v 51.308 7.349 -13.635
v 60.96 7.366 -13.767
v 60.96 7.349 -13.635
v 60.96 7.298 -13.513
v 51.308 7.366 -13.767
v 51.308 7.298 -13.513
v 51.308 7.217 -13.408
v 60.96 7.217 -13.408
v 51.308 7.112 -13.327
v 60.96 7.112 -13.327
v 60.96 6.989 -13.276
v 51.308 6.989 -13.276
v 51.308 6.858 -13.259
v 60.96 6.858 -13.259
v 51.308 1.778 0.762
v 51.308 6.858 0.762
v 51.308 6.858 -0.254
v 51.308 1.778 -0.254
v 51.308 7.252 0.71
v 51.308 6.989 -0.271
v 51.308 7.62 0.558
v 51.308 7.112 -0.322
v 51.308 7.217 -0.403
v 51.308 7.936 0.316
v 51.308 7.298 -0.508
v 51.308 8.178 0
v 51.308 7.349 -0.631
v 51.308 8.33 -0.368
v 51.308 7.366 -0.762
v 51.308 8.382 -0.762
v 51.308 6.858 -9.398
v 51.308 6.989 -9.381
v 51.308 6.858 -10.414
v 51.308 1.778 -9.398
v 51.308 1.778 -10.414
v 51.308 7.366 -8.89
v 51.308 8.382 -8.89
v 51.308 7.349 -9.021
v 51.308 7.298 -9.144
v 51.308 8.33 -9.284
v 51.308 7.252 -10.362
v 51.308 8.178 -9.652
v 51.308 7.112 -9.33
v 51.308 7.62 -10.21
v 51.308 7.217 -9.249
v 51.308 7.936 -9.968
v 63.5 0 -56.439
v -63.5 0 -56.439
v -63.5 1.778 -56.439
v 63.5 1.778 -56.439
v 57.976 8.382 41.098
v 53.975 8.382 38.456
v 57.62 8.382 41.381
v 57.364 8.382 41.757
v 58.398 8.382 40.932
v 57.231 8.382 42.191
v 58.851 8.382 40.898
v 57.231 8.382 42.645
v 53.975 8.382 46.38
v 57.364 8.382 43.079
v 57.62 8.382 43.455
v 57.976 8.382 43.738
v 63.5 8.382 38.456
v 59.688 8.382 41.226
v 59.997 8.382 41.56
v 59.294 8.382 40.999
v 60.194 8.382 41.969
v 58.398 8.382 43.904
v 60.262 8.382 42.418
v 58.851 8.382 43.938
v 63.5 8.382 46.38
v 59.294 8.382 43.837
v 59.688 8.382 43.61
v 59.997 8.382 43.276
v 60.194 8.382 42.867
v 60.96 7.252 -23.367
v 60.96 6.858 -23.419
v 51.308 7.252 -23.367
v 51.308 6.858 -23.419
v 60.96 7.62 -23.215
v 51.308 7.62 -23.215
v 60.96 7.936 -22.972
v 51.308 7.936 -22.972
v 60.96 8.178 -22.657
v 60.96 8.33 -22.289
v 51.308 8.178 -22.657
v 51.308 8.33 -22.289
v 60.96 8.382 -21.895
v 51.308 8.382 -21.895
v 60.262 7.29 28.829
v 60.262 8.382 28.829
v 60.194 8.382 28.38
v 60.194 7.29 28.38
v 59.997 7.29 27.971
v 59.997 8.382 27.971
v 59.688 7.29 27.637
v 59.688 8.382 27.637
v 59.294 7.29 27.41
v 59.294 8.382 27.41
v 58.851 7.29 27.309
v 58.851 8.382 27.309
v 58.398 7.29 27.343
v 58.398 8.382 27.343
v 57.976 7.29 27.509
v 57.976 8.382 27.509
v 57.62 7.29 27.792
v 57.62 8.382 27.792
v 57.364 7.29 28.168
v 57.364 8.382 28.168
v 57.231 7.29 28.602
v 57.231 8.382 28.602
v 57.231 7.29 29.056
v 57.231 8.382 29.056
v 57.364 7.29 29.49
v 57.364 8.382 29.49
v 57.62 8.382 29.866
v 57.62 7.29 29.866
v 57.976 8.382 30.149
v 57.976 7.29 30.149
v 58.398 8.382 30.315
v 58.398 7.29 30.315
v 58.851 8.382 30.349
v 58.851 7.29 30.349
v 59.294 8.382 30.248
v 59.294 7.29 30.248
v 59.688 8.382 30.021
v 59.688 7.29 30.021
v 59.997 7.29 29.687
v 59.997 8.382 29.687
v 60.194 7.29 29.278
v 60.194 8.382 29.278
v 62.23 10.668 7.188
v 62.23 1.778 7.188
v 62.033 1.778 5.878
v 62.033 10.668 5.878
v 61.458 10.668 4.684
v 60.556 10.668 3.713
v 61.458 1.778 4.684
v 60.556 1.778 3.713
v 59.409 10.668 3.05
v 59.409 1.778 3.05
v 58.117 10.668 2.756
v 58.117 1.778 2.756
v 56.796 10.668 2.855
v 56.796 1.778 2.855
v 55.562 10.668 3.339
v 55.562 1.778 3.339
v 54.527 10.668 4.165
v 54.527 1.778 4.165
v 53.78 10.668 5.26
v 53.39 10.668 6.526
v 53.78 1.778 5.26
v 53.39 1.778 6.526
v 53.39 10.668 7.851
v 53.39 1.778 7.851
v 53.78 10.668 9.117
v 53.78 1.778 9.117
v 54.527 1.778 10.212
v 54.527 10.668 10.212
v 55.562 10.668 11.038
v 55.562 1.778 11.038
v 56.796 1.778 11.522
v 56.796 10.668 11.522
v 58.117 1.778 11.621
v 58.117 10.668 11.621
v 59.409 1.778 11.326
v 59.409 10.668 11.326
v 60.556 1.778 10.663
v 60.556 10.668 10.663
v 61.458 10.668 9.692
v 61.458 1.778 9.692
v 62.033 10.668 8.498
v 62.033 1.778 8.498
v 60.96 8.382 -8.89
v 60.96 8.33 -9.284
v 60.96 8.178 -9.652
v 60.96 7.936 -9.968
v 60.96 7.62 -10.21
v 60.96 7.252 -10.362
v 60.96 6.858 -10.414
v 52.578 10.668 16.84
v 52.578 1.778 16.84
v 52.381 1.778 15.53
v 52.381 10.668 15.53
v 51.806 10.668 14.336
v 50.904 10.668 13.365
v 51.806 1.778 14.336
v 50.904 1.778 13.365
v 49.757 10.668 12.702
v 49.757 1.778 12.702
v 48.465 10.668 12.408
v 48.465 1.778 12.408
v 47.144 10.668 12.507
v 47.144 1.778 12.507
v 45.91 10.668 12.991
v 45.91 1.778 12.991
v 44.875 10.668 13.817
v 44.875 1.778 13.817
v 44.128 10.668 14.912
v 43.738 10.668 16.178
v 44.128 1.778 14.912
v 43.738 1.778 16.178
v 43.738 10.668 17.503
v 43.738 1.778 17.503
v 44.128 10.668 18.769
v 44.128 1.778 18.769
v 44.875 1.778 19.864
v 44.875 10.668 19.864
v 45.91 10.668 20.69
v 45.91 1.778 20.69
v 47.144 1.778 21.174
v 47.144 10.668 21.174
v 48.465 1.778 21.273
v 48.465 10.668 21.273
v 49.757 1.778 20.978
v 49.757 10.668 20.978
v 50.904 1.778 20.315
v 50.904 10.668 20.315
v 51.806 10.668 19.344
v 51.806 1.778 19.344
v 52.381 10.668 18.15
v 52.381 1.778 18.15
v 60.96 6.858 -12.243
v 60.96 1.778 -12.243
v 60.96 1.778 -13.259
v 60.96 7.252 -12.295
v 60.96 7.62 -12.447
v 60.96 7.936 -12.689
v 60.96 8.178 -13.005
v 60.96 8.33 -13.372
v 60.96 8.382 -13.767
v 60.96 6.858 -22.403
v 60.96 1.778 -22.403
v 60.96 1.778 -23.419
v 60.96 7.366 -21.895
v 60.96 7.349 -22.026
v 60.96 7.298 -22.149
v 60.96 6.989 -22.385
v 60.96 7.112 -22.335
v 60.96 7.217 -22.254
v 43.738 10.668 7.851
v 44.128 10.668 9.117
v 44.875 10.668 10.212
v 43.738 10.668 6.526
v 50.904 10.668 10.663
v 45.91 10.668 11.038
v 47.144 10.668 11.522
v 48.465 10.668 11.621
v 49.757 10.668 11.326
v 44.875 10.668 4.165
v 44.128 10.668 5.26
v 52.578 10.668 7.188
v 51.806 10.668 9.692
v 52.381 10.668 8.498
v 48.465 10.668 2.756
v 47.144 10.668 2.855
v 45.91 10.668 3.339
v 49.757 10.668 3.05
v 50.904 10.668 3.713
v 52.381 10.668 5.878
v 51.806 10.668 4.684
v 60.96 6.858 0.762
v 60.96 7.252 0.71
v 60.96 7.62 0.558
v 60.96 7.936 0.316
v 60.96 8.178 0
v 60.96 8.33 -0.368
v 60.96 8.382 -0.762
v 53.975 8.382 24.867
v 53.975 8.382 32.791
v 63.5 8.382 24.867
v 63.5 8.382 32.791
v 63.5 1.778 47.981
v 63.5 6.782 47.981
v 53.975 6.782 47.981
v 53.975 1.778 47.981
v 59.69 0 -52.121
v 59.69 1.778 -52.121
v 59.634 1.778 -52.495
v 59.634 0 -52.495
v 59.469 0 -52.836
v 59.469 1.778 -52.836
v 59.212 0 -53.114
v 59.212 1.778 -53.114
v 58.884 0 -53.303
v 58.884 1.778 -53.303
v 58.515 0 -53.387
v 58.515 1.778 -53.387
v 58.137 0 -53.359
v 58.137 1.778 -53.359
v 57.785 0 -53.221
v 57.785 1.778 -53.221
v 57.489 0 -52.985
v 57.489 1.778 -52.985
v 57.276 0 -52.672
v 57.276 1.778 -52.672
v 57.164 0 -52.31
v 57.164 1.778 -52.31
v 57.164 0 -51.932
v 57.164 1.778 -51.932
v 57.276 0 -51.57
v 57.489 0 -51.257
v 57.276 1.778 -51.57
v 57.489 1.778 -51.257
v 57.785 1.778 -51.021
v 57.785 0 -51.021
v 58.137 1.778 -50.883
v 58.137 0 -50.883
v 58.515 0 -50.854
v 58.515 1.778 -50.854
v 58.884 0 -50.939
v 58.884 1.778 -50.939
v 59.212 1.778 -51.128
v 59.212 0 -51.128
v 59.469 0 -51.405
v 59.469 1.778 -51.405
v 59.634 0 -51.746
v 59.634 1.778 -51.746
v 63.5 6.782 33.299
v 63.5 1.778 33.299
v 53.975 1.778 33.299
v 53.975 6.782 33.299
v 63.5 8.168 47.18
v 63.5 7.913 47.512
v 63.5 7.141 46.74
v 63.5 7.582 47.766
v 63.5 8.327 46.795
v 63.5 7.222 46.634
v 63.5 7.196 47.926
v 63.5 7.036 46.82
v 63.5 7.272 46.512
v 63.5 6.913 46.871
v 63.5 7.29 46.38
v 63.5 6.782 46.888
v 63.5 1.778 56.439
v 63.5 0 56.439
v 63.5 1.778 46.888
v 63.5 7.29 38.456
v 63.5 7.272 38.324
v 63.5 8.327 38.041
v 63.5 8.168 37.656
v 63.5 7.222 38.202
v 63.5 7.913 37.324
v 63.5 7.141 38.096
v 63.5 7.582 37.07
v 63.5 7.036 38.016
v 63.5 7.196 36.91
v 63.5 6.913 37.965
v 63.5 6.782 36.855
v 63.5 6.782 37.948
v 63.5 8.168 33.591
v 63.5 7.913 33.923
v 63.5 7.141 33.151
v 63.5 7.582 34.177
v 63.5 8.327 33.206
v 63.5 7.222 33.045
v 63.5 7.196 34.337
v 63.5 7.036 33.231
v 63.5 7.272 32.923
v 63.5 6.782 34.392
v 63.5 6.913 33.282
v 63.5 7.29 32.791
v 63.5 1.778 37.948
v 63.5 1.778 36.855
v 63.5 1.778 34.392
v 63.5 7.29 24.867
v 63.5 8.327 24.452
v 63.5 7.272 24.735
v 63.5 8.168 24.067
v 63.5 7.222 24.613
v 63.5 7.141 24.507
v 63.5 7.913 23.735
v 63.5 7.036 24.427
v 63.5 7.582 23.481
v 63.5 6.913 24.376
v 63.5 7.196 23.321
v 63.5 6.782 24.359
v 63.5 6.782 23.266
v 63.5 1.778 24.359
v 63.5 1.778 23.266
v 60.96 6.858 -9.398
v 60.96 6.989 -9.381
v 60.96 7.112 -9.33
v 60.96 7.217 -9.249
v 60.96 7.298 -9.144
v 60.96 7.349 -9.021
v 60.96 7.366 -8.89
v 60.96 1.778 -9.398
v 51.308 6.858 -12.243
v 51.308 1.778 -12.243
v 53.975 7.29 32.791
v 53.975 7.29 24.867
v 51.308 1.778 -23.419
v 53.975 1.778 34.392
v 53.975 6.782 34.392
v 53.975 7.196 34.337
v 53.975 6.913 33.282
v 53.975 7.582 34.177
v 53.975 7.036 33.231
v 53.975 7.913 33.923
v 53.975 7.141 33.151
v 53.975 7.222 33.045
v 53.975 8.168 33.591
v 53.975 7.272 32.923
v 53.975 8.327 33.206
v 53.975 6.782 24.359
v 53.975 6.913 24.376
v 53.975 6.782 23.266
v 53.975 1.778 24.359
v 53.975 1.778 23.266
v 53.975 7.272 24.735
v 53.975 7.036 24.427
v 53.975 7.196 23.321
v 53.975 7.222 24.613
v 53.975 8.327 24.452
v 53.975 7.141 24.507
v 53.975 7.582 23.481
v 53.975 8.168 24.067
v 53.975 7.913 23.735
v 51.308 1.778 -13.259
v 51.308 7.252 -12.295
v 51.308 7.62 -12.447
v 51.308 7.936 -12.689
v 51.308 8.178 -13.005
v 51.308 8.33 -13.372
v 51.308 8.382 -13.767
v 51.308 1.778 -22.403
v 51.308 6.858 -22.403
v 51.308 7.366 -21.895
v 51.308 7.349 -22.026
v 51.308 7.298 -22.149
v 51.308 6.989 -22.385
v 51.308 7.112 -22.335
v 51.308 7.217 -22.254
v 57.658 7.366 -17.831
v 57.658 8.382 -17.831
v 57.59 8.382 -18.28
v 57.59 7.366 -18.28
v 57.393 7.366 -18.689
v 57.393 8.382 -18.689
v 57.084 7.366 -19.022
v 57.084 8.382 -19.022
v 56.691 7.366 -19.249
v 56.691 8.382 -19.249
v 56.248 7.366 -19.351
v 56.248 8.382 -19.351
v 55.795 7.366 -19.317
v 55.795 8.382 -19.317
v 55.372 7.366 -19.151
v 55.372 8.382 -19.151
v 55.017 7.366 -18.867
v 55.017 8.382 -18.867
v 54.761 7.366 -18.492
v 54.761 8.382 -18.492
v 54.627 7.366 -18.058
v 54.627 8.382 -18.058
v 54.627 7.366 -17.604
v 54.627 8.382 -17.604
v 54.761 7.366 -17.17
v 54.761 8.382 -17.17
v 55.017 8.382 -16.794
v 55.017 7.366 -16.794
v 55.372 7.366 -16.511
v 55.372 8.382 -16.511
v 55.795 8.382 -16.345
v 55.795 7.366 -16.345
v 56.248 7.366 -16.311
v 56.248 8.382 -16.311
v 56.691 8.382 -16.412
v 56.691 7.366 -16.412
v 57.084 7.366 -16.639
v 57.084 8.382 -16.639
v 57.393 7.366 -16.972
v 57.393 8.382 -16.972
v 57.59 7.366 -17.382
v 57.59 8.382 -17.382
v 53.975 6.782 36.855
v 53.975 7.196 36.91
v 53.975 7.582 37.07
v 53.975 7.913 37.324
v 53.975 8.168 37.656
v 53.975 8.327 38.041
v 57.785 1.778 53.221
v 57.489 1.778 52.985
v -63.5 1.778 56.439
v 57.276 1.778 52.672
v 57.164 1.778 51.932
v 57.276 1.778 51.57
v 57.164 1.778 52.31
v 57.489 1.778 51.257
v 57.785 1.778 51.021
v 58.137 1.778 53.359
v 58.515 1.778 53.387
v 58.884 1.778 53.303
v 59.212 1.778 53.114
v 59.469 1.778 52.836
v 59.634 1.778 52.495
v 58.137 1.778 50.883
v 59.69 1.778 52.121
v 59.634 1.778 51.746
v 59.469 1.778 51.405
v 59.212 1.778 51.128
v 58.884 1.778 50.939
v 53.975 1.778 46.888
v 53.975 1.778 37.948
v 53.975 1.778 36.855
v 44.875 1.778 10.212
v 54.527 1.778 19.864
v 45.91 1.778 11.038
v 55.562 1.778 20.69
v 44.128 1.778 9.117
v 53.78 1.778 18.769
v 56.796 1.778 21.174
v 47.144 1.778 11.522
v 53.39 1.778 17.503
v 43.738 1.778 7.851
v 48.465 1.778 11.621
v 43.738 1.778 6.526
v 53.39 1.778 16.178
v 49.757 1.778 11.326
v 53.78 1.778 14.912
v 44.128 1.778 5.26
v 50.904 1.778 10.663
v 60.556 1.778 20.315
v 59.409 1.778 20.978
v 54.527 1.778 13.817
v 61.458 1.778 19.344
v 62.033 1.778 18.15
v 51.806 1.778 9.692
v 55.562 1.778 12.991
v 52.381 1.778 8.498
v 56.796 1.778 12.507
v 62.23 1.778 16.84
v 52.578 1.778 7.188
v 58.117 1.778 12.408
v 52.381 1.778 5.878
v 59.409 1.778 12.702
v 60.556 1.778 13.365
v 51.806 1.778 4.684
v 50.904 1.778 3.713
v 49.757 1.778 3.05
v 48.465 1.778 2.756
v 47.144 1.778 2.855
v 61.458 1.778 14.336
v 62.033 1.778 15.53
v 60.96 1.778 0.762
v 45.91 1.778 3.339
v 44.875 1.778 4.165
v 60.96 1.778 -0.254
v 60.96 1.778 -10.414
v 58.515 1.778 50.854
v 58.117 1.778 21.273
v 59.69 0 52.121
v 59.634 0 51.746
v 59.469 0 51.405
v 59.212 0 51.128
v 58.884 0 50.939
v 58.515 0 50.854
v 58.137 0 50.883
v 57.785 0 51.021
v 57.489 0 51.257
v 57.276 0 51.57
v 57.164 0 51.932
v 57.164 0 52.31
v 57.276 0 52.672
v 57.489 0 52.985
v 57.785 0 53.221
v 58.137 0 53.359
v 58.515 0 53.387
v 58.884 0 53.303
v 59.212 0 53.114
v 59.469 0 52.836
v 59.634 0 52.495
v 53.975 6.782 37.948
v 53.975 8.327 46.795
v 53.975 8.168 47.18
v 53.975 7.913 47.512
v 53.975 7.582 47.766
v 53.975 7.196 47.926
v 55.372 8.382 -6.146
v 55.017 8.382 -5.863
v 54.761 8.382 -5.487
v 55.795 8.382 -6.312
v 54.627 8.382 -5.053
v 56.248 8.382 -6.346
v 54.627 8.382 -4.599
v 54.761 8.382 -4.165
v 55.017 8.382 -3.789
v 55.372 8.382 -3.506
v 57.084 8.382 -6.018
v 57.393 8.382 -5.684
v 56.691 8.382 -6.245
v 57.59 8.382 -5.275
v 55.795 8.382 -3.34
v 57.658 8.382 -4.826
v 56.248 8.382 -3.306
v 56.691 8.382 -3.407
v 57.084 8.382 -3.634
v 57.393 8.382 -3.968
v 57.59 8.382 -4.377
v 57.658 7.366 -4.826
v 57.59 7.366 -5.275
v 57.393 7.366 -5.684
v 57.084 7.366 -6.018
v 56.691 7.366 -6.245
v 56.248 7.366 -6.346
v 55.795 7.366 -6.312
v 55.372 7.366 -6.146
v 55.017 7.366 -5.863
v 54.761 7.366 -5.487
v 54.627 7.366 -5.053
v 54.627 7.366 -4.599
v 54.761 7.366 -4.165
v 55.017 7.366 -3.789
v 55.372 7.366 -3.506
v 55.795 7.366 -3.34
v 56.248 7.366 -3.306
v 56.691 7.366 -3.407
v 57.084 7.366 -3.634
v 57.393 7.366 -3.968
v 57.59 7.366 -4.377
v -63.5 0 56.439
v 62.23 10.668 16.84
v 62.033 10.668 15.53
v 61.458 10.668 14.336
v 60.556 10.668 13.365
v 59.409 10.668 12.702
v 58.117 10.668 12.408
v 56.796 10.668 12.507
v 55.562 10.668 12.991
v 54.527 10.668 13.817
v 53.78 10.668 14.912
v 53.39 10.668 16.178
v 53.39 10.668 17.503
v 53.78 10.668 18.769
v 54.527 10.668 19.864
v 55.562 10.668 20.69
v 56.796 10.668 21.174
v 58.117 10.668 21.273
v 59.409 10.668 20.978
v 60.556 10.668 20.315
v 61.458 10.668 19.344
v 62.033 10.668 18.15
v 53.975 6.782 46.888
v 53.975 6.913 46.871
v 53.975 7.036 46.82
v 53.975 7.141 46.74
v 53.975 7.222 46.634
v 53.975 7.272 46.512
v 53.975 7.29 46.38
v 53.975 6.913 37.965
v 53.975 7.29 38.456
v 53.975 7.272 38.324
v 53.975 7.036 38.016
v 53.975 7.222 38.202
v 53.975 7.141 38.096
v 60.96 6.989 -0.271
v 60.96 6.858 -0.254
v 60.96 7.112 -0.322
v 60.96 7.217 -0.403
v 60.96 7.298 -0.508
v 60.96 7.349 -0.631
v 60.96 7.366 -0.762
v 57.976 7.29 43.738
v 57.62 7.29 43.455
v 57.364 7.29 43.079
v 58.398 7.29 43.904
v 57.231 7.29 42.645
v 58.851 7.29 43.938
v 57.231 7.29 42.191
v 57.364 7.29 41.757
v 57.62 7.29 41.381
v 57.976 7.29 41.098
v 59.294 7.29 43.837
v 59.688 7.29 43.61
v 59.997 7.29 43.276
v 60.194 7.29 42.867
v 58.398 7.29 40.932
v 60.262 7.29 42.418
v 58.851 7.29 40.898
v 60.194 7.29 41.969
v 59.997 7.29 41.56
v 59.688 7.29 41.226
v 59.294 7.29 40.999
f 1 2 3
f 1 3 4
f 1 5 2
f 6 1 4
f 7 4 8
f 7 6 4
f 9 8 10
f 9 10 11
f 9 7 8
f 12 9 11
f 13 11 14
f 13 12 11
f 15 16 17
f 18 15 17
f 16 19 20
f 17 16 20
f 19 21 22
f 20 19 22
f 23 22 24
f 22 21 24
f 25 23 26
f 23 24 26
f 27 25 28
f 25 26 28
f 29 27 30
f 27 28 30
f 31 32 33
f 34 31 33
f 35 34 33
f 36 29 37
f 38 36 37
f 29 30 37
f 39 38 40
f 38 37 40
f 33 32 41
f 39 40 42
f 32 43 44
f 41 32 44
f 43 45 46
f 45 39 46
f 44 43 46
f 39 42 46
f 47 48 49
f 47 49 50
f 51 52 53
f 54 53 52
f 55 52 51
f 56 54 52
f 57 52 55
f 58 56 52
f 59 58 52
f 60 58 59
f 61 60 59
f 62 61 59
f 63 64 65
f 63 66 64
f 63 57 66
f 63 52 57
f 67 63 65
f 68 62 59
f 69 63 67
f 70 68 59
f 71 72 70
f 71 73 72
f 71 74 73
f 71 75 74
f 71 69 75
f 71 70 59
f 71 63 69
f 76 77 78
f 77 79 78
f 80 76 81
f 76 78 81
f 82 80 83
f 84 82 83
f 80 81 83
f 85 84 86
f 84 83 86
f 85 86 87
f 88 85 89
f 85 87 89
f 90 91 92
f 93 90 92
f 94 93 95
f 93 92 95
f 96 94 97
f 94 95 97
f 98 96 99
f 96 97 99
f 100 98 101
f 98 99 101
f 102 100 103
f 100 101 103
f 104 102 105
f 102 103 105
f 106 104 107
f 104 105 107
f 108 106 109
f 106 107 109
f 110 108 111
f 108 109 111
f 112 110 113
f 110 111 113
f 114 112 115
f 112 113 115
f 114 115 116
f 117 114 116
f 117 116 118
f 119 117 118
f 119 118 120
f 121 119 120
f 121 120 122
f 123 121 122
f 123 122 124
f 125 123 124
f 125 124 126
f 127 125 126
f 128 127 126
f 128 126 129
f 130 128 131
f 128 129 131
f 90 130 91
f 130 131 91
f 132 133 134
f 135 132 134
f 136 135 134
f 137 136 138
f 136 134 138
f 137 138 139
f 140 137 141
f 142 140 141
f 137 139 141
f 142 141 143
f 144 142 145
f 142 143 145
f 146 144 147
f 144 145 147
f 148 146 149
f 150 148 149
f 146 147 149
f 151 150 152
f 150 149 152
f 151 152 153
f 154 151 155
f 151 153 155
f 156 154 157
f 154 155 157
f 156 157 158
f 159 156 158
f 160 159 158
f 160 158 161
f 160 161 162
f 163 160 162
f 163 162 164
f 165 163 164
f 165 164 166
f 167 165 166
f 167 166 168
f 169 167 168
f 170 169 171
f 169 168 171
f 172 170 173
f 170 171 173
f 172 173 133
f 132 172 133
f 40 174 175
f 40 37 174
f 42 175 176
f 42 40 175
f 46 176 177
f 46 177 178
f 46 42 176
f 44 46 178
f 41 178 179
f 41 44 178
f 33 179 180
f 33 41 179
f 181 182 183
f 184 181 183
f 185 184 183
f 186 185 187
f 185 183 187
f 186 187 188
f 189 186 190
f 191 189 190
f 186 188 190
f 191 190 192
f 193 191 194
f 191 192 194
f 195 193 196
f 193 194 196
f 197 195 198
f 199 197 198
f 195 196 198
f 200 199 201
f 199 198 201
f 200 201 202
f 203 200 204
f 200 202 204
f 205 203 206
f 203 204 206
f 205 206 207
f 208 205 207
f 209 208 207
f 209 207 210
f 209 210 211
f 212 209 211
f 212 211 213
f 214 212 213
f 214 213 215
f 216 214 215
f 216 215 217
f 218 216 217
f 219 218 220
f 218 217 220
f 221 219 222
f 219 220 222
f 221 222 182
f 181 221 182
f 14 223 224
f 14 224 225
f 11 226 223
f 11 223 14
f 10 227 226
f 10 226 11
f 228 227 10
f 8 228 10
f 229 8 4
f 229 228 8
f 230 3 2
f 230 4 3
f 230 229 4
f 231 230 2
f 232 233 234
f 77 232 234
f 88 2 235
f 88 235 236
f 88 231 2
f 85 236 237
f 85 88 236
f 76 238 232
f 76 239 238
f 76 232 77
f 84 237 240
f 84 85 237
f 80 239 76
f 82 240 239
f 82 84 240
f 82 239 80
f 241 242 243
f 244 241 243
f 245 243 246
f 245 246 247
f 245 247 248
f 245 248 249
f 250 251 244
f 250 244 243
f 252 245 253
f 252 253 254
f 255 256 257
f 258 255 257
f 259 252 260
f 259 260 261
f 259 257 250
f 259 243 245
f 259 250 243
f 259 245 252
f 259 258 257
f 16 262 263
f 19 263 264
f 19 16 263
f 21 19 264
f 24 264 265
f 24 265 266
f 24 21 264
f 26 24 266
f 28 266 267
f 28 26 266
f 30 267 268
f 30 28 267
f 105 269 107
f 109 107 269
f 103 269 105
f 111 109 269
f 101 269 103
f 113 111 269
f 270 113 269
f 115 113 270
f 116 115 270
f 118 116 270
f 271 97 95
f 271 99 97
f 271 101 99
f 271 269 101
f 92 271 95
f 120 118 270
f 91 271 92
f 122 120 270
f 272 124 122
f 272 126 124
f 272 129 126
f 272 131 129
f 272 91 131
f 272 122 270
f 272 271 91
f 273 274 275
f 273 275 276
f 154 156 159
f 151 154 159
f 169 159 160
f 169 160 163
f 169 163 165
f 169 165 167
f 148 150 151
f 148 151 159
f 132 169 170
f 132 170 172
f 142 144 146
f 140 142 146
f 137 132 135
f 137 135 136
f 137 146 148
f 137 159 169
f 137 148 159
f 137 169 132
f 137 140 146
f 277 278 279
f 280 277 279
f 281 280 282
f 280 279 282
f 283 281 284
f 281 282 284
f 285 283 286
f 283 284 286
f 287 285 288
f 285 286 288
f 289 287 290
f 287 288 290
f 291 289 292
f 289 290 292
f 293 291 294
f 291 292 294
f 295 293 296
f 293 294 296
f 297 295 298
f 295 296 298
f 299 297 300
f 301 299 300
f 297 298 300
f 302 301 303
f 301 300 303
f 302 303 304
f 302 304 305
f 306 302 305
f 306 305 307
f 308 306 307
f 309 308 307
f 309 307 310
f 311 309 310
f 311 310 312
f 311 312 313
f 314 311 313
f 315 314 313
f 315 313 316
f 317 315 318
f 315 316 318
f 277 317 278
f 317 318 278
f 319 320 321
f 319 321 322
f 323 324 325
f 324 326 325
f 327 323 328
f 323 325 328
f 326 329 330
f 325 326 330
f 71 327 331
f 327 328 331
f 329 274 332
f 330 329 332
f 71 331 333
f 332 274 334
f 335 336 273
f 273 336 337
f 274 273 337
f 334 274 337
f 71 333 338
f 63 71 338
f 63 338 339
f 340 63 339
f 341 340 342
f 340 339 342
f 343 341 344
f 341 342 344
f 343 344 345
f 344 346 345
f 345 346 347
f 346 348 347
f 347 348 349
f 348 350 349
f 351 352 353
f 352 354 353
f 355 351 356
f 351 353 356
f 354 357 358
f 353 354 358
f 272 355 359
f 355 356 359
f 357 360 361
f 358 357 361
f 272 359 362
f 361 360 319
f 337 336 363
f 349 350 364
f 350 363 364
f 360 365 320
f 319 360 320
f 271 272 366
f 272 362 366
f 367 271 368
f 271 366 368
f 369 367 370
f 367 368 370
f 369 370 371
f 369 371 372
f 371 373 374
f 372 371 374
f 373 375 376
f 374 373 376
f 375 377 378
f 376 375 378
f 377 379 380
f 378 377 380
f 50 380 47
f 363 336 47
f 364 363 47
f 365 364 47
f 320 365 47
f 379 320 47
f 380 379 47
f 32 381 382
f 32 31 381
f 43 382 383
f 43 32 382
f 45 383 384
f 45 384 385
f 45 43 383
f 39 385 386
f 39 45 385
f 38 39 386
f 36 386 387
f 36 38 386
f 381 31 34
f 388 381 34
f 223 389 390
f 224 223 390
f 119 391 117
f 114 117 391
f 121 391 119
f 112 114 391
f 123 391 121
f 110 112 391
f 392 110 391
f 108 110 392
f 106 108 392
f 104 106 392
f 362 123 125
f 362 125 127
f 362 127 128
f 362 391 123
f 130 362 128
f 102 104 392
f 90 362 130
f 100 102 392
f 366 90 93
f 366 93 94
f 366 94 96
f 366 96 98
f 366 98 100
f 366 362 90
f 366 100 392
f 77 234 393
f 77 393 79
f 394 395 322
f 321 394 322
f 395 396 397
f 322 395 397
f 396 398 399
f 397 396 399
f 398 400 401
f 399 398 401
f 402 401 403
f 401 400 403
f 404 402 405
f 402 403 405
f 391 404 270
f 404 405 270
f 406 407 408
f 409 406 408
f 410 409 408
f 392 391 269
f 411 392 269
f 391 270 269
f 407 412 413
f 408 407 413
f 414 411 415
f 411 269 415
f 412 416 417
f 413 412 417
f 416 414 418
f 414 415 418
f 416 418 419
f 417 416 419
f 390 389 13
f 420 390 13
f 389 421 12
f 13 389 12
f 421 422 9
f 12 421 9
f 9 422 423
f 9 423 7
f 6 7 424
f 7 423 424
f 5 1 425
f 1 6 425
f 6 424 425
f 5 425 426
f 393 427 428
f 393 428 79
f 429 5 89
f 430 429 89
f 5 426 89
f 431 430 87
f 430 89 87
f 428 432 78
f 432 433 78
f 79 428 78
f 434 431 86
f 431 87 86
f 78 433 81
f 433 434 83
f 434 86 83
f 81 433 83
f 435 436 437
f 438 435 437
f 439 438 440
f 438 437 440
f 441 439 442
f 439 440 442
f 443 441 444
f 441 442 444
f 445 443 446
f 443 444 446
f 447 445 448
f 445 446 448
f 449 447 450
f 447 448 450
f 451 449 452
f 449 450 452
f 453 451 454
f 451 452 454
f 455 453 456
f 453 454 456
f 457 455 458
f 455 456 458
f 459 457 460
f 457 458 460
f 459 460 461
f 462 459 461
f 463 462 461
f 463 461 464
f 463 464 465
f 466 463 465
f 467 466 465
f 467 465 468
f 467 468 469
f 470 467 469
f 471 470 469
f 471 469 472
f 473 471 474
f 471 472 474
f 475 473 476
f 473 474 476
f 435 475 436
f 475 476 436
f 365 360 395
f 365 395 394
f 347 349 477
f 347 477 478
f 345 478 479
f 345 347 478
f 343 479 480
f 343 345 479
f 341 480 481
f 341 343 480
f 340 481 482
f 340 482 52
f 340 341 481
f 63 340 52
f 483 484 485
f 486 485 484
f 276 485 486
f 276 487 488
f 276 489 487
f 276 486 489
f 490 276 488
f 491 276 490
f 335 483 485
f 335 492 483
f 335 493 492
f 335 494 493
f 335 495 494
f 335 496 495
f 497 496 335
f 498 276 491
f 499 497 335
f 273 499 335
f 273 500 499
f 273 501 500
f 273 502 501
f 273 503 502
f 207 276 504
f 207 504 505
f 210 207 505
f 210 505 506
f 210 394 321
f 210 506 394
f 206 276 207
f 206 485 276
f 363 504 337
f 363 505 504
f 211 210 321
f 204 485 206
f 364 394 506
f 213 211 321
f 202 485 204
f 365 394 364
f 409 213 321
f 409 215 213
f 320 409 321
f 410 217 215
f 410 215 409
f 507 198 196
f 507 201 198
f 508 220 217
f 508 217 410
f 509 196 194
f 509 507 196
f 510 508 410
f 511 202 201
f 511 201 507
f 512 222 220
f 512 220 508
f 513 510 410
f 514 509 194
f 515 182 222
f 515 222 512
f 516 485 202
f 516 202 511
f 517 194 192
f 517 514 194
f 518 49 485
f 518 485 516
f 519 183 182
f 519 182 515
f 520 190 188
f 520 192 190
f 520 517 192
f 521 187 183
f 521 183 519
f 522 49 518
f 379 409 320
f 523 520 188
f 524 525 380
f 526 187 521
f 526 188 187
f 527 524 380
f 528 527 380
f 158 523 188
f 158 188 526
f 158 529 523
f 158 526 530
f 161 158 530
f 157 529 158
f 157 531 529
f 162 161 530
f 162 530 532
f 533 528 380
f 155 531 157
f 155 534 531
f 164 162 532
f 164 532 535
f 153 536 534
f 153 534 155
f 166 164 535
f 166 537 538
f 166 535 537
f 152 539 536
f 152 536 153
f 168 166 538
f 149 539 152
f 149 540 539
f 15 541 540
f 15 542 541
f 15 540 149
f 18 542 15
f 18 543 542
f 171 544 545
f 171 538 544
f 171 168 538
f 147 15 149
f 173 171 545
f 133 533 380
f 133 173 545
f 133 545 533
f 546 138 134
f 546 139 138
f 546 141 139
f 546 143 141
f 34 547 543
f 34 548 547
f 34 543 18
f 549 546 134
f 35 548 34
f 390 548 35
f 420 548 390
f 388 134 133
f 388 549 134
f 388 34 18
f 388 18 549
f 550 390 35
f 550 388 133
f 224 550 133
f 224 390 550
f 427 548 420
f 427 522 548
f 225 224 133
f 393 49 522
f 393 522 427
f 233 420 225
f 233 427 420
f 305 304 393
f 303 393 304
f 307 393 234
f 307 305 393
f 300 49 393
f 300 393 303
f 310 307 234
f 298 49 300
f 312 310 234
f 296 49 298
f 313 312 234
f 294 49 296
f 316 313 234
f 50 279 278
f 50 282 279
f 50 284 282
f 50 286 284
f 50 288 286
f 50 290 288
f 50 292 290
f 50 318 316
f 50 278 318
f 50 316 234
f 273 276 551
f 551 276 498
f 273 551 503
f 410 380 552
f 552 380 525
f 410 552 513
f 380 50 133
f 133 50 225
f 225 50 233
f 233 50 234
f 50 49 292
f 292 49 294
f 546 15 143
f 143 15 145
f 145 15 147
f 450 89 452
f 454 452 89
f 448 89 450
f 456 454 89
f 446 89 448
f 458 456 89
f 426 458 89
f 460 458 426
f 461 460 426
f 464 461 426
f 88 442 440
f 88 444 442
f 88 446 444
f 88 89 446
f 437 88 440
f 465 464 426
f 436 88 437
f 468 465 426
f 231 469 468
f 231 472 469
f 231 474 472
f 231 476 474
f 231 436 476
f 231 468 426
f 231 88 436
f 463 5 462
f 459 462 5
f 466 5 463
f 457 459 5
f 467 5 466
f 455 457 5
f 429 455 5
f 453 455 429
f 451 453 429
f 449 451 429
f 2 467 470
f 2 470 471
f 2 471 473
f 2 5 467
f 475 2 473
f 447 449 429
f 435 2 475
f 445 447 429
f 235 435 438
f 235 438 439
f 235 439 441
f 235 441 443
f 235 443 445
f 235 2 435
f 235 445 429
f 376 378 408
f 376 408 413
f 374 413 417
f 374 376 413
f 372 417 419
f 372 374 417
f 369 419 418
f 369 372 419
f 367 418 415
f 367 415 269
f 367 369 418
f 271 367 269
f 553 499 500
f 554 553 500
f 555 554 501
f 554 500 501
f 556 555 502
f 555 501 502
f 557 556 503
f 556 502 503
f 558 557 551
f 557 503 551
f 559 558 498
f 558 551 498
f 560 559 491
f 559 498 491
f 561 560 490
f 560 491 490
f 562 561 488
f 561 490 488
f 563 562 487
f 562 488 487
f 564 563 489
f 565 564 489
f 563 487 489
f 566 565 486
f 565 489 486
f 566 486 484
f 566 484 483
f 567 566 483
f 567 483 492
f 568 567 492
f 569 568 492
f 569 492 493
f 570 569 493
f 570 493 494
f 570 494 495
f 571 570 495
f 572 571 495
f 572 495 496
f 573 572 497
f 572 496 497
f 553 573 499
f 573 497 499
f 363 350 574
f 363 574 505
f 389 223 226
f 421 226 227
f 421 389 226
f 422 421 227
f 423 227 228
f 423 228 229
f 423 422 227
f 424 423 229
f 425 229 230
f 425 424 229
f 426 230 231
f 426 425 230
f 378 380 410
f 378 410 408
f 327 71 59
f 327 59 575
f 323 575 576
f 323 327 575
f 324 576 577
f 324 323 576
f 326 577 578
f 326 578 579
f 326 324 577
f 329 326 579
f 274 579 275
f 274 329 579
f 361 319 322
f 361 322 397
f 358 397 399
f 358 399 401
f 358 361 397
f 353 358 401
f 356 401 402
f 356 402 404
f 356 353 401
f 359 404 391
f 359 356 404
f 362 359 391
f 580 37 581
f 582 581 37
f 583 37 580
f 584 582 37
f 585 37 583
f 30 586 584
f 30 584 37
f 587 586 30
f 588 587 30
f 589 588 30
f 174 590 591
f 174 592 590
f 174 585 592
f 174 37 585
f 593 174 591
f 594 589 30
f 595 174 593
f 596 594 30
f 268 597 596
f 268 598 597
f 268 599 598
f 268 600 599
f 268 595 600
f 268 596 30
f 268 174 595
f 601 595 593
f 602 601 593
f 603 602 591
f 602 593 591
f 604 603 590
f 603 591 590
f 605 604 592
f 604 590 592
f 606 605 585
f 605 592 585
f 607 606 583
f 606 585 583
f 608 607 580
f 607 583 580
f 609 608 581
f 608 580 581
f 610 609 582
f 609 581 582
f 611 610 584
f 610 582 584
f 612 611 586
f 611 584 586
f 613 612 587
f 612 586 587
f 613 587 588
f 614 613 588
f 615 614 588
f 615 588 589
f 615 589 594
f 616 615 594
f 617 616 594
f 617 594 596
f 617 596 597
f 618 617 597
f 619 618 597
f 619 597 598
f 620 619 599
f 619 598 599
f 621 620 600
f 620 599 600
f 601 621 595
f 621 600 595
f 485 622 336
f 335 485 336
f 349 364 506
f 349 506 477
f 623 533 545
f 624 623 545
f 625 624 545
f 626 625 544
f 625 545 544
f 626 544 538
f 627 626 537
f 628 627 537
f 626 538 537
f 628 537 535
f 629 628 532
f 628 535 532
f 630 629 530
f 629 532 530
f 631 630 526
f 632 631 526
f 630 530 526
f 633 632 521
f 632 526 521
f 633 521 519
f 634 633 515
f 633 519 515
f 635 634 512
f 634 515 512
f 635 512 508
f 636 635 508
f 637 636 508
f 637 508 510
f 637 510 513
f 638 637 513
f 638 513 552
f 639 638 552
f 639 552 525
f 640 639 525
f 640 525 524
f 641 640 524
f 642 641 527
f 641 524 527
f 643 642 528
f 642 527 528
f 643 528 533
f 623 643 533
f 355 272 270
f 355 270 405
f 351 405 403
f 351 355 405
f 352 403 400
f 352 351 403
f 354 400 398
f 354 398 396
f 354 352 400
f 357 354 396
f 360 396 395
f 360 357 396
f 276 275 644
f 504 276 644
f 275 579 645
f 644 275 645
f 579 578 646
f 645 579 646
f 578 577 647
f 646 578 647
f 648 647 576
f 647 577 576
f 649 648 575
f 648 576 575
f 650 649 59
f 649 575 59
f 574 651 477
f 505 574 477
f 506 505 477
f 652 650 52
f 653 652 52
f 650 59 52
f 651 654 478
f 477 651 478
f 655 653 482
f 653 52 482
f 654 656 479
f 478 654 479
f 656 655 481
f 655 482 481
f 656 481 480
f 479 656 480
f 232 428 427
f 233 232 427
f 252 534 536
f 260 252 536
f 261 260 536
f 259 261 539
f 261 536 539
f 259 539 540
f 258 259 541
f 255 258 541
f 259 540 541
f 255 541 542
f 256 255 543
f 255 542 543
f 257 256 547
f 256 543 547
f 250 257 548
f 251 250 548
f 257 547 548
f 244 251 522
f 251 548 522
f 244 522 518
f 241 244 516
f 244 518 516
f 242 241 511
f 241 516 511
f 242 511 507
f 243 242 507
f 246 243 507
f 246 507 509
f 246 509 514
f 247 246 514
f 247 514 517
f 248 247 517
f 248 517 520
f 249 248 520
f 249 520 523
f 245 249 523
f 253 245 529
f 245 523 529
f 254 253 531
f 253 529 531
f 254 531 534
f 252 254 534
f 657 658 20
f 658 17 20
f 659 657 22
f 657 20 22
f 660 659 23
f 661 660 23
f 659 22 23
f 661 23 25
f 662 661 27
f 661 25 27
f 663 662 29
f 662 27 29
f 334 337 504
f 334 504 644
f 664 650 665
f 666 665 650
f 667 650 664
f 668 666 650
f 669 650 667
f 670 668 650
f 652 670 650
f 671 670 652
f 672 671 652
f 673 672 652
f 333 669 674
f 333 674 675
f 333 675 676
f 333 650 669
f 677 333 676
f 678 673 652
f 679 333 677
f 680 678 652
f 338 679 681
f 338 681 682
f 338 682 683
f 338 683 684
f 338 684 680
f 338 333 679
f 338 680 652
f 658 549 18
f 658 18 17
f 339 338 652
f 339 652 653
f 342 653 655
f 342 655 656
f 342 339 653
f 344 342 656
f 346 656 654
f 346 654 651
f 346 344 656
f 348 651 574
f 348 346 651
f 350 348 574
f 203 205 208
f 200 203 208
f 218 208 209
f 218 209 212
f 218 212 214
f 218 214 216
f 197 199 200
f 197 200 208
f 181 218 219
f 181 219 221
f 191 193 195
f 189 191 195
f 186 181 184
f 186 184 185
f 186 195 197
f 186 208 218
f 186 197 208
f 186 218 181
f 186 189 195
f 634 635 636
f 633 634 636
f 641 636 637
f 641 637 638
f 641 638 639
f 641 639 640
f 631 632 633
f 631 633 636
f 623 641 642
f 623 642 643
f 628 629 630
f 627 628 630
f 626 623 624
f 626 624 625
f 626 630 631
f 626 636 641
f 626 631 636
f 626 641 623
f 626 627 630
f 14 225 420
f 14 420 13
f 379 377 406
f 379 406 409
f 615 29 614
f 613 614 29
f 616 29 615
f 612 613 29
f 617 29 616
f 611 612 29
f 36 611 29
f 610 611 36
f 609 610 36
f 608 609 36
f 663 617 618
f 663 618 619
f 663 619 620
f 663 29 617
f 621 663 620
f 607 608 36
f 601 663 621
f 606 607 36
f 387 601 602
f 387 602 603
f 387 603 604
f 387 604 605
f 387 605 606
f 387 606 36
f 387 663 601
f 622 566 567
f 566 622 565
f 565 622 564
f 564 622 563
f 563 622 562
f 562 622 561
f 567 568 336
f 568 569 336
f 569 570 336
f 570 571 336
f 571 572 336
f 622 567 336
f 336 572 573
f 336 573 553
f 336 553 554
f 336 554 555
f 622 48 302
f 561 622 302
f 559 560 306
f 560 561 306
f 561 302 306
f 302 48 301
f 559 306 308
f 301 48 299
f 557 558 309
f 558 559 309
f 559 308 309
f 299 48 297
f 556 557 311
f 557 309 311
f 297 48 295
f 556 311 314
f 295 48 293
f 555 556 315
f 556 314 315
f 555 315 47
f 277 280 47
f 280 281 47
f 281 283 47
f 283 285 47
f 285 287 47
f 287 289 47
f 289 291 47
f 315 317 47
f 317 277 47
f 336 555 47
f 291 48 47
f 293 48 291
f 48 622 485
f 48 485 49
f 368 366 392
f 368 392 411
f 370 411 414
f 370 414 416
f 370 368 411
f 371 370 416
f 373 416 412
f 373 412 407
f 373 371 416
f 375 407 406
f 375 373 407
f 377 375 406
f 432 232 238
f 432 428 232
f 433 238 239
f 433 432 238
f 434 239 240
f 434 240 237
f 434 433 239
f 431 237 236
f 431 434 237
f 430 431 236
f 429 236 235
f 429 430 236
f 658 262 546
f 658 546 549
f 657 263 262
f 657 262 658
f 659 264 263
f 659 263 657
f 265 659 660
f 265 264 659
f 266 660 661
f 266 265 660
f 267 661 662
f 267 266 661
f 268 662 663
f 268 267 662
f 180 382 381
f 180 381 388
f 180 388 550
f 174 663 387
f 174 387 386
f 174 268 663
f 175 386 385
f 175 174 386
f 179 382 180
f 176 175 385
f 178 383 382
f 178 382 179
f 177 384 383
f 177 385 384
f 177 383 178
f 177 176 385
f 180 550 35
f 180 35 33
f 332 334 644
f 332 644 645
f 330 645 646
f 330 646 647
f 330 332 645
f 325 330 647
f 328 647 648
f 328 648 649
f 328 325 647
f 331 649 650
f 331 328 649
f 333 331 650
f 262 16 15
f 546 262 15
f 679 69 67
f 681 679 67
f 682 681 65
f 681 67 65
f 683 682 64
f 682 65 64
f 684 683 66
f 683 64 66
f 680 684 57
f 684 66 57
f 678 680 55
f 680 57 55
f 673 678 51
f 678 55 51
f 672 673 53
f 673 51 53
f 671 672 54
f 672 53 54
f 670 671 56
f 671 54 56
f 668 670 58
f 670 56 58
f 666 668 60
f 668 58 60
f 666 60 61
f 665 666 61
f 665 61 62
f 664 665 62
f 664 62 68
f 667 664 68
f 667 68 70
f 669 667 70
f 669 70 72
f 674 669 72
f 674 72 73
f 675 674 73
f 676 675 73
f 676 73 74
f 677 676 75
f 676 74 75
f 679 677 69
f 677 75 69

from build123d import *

# Parameters (mm, degrees)
SKETCH1_W           = 127
SKETCH1_H           = 112.8776
BOSS_EXTRUDE1_DEPTH = 1.778
SKETCH2_R           = 1.27
CUT_EXTRUDE1_DEPTH  = 1.778
BOSS_EXTRUDE2_DEPTH = 9.525
SKETCH4_R           = 1.524
CUT_EXTRUDE2_DEPTH  = 1.0922
LPATTERN1_COUNT     = 2
LPATTERN1_PITCH     = 13.589
BOSS_EXTRUDE3_DEPTH = 9.652
SKETCH6_R           = 1.524
CUT_EXTRUDE3_DEPTH  = 1.016
FILLET1_R           = 1.524
FILLET2_R           = 0.508
LPATTERN2_COUNT     = 2
LPATTERN2_PITCH     = 13.0048
SKETCH7_R           = 1.524
CUT_EXTRUDE4_DEPTH  = 1.016
FILLET3_R           = 0.508
FILLET4_R           = 1.524
SKETCH8_R           = 4.445
BOSS_EXTRUDE4_DEPTH = 8.89


with BuildPart() as part:
    # Sketch1 → Boss-Extrude1 (new body)
    with BuildSketch(Plane(origin=(0, 0, 0), x_dir=(1, 0, 0), z_dir=(0, 1, 0))):
        Rectangle(SKETCH1_W, SKETCH1_H)
    extrude(amount=BOSS_EXTRUDE1_DEPTH)

    # Sketch2 → Cut-Extrude1 (cut)
    with BuildSketch(Plane(origin=(0, 1.778, 0), x_dir=(1, 0, 0), z_dir=(0, 1, 0))):
        with Locations((58.42, 52.1208)):
            Circle(SKETCH2_R)
        with Locations((58.42, -52.1208)):
            Circle(SKETCH2_R)
    extrude(amount=-CUT_EXTRUDE1_DEPTH, mode=Mode.SUBTRACT)

    # Sketch3 → Boss-Extrude2 (add)
    with BuildSketch(Plane(origin=(63.5, 0, 0), x_dir=(0, 0, -1), z_dir=(1, 0, 0))):
        with BuildLine():
            Line((-46.8884, 1.778), (-46.8884, 6.7818))
            ThreePointArc((-46.8884, 6.7818), (-46.739610245, 7.141010245), (-46.3804, 7.2898))
            Line((-46.3804, 7.2898), (-38.4556, 7.2898))
            ThreePointArc((-38.4556, 7.2898), (-38.096389755, 7.141010245), (-37.9476, 6.7818))
            Line((-37.9476, 6.7818), (-37.9476, 1.778))
            Line((-37.9476, 1.778), (-36.8554, 1.778))
            Line((-36.8554, 1.778), (-36.8554, 6.7818))
            ThreePointArc((-36.8554, 6.7818), (-37.324087729, 7.913312271), (-38.4556, 8.382))
            Line((-38.4556, 8.382), (-46.3804, 8.382))
            ThreePointArc((-46.3804, 8.382), (-47.511912271, 7.913312271), (-47.9806, 6.7818))
            Line((-47.9806, 6.7818), (-47.9806, 1.778))
            Line((-47.9806, 1.778), (-46.8884, 1.778))
        make_face()
    boss_extrude2 = extrude(amount=-BOSS_EXTRUDE2_DEPTH)

    # Sketch4 → Cut-Extrude2 (cut)
    with BuildSketch(Plane(origin=(0, 8.382, 0), x_dir=(1, 0, 0), z_dir=(0, 1, 0))):
        with Locations((58.7375, -42.418)):
            Circle(SKETCH4_R)
    cut_extrude2 = extrude(amount=-CUT_EXTRUDE2_DEPTH, mode=Mode.SUBTRACT)

    # LPattern1: Boss-Extrude2, Cut-Extrude2 ×2
    with Locations(*[(0, 0, -i * LPATTERN1_PITCH) for i in range(1, LPATTERN1_COUNT)]):
        add(boss_extrude2)
        add(cut_extrude2, mode=Mode.SUBTRACT)

    # Sketch5 → Boss-Extrude3 (add)
    with BuildSketch(Plane(origin=(60.96, 0, 0), x_dir=(0, 0, -1), z_dir=(1, 0, 0))):
        Polygon((23.4188, 1.778), (23.4188, 8.382), (12.2428, 8.382), (12.2428, 1.778), (13.2588, 1.778), (13.2588, 7.366), (22.4028, 7.366), (22.4028, 1.778), align=None)
    boss_extrude3 = extrude(amount=-BOSS_EXTRUDE3_DEPTH)

    # Sketch6 → Cut-Extrude3 (cut)
    with BuildSketch(Plane(origin=(0, 8.382, 0), x_dir=(1, 0, 0), z_dir=(0, 1, 0))):
        with Locations((56.134, 17.8308)):
            Circle(SKETCH6_R)
    extrude(amount=-CUT_EXTRUDE3_DEPTH, mode=Mode.SUBTRACT)

    # Fillet1
    fillet1_edges = [part.edges().sort_by_distance(p)[0] for p in [
        (56.134, 8.382, -12.2428),
        (56.134, 8.382, -23.4188),
    ]]
    fillet(fillet1_edges, radius=FILLET1_R)

    # Fillet2
    fillet2_edges = [part.edges().sort_by_distance(p)[0] for p in [
        (56.134, 7.366, -22.4028),
        (56.134, 7.366, -13.2588),
    ]]
    fillet(fillet2_edges, radius=FILLET2_R)

    # LPattern2: Boss-Extrude3 ×2
    with Locations(*[(0, 0, i * LPATTERN2_PITCH) for i in range(1, LPATTERN2_COUNT)]):
        add(boss_extrude3)

    # Sketch7 → Cut-Extrude4 (cut)
    with BuildSketch(Plane(origin=(0, 8.382, 0), x_dir=(1, 0, 0), z_dir=(0, 1, 0))):
        with Locations((56.134, 4.826)):
            Circle(SKETCH7_R)
    extrude(amount=-CUT_EXTRUDE4_DEPTH, mode=Mode.SUBTRACT)

    # Fillet3
    fillet3_edges = [part.edges().sort_by_distance(p)[0] for p in [
        (56.134, 7.366, -9.398),
        (56.134, 7.366, -0.254),
    ]]
    fillet(fillet3_edges, radius=FILLET3_R)

    # Fillet4
    fillet4_edges = [part.edges().sort_by_distance(p)[0] for p in [
        (56.134, 8.382, 0.762),
        (56.134, 8.382, -10.414),
    ]]
    fillet(fillet4_edges, radius=FILLET4_R)

    # Sketch8 → Boss-Extrude4 (add)
    with BuildSketch(Plane(origin=(0, 1.778, 0), x_dir=(1, 0, 0), z_dir=(0, 1, 0))):
        with Locations((57.785, -7.1882)):
            Circle(SKETCH8_R)
        with Locations((57.785, -16.8402)):
            Circle(SKETCH8_R)
        with Locations((48.133, -7.1882)):
            Circle(SKETCH8_R)
        with Locations((48.133, -16.8402)):
            Circle(SKETCH8_R)
    extrude(amount=BOSS_EXTRUDE4_DEPTH)


solid = part.part
